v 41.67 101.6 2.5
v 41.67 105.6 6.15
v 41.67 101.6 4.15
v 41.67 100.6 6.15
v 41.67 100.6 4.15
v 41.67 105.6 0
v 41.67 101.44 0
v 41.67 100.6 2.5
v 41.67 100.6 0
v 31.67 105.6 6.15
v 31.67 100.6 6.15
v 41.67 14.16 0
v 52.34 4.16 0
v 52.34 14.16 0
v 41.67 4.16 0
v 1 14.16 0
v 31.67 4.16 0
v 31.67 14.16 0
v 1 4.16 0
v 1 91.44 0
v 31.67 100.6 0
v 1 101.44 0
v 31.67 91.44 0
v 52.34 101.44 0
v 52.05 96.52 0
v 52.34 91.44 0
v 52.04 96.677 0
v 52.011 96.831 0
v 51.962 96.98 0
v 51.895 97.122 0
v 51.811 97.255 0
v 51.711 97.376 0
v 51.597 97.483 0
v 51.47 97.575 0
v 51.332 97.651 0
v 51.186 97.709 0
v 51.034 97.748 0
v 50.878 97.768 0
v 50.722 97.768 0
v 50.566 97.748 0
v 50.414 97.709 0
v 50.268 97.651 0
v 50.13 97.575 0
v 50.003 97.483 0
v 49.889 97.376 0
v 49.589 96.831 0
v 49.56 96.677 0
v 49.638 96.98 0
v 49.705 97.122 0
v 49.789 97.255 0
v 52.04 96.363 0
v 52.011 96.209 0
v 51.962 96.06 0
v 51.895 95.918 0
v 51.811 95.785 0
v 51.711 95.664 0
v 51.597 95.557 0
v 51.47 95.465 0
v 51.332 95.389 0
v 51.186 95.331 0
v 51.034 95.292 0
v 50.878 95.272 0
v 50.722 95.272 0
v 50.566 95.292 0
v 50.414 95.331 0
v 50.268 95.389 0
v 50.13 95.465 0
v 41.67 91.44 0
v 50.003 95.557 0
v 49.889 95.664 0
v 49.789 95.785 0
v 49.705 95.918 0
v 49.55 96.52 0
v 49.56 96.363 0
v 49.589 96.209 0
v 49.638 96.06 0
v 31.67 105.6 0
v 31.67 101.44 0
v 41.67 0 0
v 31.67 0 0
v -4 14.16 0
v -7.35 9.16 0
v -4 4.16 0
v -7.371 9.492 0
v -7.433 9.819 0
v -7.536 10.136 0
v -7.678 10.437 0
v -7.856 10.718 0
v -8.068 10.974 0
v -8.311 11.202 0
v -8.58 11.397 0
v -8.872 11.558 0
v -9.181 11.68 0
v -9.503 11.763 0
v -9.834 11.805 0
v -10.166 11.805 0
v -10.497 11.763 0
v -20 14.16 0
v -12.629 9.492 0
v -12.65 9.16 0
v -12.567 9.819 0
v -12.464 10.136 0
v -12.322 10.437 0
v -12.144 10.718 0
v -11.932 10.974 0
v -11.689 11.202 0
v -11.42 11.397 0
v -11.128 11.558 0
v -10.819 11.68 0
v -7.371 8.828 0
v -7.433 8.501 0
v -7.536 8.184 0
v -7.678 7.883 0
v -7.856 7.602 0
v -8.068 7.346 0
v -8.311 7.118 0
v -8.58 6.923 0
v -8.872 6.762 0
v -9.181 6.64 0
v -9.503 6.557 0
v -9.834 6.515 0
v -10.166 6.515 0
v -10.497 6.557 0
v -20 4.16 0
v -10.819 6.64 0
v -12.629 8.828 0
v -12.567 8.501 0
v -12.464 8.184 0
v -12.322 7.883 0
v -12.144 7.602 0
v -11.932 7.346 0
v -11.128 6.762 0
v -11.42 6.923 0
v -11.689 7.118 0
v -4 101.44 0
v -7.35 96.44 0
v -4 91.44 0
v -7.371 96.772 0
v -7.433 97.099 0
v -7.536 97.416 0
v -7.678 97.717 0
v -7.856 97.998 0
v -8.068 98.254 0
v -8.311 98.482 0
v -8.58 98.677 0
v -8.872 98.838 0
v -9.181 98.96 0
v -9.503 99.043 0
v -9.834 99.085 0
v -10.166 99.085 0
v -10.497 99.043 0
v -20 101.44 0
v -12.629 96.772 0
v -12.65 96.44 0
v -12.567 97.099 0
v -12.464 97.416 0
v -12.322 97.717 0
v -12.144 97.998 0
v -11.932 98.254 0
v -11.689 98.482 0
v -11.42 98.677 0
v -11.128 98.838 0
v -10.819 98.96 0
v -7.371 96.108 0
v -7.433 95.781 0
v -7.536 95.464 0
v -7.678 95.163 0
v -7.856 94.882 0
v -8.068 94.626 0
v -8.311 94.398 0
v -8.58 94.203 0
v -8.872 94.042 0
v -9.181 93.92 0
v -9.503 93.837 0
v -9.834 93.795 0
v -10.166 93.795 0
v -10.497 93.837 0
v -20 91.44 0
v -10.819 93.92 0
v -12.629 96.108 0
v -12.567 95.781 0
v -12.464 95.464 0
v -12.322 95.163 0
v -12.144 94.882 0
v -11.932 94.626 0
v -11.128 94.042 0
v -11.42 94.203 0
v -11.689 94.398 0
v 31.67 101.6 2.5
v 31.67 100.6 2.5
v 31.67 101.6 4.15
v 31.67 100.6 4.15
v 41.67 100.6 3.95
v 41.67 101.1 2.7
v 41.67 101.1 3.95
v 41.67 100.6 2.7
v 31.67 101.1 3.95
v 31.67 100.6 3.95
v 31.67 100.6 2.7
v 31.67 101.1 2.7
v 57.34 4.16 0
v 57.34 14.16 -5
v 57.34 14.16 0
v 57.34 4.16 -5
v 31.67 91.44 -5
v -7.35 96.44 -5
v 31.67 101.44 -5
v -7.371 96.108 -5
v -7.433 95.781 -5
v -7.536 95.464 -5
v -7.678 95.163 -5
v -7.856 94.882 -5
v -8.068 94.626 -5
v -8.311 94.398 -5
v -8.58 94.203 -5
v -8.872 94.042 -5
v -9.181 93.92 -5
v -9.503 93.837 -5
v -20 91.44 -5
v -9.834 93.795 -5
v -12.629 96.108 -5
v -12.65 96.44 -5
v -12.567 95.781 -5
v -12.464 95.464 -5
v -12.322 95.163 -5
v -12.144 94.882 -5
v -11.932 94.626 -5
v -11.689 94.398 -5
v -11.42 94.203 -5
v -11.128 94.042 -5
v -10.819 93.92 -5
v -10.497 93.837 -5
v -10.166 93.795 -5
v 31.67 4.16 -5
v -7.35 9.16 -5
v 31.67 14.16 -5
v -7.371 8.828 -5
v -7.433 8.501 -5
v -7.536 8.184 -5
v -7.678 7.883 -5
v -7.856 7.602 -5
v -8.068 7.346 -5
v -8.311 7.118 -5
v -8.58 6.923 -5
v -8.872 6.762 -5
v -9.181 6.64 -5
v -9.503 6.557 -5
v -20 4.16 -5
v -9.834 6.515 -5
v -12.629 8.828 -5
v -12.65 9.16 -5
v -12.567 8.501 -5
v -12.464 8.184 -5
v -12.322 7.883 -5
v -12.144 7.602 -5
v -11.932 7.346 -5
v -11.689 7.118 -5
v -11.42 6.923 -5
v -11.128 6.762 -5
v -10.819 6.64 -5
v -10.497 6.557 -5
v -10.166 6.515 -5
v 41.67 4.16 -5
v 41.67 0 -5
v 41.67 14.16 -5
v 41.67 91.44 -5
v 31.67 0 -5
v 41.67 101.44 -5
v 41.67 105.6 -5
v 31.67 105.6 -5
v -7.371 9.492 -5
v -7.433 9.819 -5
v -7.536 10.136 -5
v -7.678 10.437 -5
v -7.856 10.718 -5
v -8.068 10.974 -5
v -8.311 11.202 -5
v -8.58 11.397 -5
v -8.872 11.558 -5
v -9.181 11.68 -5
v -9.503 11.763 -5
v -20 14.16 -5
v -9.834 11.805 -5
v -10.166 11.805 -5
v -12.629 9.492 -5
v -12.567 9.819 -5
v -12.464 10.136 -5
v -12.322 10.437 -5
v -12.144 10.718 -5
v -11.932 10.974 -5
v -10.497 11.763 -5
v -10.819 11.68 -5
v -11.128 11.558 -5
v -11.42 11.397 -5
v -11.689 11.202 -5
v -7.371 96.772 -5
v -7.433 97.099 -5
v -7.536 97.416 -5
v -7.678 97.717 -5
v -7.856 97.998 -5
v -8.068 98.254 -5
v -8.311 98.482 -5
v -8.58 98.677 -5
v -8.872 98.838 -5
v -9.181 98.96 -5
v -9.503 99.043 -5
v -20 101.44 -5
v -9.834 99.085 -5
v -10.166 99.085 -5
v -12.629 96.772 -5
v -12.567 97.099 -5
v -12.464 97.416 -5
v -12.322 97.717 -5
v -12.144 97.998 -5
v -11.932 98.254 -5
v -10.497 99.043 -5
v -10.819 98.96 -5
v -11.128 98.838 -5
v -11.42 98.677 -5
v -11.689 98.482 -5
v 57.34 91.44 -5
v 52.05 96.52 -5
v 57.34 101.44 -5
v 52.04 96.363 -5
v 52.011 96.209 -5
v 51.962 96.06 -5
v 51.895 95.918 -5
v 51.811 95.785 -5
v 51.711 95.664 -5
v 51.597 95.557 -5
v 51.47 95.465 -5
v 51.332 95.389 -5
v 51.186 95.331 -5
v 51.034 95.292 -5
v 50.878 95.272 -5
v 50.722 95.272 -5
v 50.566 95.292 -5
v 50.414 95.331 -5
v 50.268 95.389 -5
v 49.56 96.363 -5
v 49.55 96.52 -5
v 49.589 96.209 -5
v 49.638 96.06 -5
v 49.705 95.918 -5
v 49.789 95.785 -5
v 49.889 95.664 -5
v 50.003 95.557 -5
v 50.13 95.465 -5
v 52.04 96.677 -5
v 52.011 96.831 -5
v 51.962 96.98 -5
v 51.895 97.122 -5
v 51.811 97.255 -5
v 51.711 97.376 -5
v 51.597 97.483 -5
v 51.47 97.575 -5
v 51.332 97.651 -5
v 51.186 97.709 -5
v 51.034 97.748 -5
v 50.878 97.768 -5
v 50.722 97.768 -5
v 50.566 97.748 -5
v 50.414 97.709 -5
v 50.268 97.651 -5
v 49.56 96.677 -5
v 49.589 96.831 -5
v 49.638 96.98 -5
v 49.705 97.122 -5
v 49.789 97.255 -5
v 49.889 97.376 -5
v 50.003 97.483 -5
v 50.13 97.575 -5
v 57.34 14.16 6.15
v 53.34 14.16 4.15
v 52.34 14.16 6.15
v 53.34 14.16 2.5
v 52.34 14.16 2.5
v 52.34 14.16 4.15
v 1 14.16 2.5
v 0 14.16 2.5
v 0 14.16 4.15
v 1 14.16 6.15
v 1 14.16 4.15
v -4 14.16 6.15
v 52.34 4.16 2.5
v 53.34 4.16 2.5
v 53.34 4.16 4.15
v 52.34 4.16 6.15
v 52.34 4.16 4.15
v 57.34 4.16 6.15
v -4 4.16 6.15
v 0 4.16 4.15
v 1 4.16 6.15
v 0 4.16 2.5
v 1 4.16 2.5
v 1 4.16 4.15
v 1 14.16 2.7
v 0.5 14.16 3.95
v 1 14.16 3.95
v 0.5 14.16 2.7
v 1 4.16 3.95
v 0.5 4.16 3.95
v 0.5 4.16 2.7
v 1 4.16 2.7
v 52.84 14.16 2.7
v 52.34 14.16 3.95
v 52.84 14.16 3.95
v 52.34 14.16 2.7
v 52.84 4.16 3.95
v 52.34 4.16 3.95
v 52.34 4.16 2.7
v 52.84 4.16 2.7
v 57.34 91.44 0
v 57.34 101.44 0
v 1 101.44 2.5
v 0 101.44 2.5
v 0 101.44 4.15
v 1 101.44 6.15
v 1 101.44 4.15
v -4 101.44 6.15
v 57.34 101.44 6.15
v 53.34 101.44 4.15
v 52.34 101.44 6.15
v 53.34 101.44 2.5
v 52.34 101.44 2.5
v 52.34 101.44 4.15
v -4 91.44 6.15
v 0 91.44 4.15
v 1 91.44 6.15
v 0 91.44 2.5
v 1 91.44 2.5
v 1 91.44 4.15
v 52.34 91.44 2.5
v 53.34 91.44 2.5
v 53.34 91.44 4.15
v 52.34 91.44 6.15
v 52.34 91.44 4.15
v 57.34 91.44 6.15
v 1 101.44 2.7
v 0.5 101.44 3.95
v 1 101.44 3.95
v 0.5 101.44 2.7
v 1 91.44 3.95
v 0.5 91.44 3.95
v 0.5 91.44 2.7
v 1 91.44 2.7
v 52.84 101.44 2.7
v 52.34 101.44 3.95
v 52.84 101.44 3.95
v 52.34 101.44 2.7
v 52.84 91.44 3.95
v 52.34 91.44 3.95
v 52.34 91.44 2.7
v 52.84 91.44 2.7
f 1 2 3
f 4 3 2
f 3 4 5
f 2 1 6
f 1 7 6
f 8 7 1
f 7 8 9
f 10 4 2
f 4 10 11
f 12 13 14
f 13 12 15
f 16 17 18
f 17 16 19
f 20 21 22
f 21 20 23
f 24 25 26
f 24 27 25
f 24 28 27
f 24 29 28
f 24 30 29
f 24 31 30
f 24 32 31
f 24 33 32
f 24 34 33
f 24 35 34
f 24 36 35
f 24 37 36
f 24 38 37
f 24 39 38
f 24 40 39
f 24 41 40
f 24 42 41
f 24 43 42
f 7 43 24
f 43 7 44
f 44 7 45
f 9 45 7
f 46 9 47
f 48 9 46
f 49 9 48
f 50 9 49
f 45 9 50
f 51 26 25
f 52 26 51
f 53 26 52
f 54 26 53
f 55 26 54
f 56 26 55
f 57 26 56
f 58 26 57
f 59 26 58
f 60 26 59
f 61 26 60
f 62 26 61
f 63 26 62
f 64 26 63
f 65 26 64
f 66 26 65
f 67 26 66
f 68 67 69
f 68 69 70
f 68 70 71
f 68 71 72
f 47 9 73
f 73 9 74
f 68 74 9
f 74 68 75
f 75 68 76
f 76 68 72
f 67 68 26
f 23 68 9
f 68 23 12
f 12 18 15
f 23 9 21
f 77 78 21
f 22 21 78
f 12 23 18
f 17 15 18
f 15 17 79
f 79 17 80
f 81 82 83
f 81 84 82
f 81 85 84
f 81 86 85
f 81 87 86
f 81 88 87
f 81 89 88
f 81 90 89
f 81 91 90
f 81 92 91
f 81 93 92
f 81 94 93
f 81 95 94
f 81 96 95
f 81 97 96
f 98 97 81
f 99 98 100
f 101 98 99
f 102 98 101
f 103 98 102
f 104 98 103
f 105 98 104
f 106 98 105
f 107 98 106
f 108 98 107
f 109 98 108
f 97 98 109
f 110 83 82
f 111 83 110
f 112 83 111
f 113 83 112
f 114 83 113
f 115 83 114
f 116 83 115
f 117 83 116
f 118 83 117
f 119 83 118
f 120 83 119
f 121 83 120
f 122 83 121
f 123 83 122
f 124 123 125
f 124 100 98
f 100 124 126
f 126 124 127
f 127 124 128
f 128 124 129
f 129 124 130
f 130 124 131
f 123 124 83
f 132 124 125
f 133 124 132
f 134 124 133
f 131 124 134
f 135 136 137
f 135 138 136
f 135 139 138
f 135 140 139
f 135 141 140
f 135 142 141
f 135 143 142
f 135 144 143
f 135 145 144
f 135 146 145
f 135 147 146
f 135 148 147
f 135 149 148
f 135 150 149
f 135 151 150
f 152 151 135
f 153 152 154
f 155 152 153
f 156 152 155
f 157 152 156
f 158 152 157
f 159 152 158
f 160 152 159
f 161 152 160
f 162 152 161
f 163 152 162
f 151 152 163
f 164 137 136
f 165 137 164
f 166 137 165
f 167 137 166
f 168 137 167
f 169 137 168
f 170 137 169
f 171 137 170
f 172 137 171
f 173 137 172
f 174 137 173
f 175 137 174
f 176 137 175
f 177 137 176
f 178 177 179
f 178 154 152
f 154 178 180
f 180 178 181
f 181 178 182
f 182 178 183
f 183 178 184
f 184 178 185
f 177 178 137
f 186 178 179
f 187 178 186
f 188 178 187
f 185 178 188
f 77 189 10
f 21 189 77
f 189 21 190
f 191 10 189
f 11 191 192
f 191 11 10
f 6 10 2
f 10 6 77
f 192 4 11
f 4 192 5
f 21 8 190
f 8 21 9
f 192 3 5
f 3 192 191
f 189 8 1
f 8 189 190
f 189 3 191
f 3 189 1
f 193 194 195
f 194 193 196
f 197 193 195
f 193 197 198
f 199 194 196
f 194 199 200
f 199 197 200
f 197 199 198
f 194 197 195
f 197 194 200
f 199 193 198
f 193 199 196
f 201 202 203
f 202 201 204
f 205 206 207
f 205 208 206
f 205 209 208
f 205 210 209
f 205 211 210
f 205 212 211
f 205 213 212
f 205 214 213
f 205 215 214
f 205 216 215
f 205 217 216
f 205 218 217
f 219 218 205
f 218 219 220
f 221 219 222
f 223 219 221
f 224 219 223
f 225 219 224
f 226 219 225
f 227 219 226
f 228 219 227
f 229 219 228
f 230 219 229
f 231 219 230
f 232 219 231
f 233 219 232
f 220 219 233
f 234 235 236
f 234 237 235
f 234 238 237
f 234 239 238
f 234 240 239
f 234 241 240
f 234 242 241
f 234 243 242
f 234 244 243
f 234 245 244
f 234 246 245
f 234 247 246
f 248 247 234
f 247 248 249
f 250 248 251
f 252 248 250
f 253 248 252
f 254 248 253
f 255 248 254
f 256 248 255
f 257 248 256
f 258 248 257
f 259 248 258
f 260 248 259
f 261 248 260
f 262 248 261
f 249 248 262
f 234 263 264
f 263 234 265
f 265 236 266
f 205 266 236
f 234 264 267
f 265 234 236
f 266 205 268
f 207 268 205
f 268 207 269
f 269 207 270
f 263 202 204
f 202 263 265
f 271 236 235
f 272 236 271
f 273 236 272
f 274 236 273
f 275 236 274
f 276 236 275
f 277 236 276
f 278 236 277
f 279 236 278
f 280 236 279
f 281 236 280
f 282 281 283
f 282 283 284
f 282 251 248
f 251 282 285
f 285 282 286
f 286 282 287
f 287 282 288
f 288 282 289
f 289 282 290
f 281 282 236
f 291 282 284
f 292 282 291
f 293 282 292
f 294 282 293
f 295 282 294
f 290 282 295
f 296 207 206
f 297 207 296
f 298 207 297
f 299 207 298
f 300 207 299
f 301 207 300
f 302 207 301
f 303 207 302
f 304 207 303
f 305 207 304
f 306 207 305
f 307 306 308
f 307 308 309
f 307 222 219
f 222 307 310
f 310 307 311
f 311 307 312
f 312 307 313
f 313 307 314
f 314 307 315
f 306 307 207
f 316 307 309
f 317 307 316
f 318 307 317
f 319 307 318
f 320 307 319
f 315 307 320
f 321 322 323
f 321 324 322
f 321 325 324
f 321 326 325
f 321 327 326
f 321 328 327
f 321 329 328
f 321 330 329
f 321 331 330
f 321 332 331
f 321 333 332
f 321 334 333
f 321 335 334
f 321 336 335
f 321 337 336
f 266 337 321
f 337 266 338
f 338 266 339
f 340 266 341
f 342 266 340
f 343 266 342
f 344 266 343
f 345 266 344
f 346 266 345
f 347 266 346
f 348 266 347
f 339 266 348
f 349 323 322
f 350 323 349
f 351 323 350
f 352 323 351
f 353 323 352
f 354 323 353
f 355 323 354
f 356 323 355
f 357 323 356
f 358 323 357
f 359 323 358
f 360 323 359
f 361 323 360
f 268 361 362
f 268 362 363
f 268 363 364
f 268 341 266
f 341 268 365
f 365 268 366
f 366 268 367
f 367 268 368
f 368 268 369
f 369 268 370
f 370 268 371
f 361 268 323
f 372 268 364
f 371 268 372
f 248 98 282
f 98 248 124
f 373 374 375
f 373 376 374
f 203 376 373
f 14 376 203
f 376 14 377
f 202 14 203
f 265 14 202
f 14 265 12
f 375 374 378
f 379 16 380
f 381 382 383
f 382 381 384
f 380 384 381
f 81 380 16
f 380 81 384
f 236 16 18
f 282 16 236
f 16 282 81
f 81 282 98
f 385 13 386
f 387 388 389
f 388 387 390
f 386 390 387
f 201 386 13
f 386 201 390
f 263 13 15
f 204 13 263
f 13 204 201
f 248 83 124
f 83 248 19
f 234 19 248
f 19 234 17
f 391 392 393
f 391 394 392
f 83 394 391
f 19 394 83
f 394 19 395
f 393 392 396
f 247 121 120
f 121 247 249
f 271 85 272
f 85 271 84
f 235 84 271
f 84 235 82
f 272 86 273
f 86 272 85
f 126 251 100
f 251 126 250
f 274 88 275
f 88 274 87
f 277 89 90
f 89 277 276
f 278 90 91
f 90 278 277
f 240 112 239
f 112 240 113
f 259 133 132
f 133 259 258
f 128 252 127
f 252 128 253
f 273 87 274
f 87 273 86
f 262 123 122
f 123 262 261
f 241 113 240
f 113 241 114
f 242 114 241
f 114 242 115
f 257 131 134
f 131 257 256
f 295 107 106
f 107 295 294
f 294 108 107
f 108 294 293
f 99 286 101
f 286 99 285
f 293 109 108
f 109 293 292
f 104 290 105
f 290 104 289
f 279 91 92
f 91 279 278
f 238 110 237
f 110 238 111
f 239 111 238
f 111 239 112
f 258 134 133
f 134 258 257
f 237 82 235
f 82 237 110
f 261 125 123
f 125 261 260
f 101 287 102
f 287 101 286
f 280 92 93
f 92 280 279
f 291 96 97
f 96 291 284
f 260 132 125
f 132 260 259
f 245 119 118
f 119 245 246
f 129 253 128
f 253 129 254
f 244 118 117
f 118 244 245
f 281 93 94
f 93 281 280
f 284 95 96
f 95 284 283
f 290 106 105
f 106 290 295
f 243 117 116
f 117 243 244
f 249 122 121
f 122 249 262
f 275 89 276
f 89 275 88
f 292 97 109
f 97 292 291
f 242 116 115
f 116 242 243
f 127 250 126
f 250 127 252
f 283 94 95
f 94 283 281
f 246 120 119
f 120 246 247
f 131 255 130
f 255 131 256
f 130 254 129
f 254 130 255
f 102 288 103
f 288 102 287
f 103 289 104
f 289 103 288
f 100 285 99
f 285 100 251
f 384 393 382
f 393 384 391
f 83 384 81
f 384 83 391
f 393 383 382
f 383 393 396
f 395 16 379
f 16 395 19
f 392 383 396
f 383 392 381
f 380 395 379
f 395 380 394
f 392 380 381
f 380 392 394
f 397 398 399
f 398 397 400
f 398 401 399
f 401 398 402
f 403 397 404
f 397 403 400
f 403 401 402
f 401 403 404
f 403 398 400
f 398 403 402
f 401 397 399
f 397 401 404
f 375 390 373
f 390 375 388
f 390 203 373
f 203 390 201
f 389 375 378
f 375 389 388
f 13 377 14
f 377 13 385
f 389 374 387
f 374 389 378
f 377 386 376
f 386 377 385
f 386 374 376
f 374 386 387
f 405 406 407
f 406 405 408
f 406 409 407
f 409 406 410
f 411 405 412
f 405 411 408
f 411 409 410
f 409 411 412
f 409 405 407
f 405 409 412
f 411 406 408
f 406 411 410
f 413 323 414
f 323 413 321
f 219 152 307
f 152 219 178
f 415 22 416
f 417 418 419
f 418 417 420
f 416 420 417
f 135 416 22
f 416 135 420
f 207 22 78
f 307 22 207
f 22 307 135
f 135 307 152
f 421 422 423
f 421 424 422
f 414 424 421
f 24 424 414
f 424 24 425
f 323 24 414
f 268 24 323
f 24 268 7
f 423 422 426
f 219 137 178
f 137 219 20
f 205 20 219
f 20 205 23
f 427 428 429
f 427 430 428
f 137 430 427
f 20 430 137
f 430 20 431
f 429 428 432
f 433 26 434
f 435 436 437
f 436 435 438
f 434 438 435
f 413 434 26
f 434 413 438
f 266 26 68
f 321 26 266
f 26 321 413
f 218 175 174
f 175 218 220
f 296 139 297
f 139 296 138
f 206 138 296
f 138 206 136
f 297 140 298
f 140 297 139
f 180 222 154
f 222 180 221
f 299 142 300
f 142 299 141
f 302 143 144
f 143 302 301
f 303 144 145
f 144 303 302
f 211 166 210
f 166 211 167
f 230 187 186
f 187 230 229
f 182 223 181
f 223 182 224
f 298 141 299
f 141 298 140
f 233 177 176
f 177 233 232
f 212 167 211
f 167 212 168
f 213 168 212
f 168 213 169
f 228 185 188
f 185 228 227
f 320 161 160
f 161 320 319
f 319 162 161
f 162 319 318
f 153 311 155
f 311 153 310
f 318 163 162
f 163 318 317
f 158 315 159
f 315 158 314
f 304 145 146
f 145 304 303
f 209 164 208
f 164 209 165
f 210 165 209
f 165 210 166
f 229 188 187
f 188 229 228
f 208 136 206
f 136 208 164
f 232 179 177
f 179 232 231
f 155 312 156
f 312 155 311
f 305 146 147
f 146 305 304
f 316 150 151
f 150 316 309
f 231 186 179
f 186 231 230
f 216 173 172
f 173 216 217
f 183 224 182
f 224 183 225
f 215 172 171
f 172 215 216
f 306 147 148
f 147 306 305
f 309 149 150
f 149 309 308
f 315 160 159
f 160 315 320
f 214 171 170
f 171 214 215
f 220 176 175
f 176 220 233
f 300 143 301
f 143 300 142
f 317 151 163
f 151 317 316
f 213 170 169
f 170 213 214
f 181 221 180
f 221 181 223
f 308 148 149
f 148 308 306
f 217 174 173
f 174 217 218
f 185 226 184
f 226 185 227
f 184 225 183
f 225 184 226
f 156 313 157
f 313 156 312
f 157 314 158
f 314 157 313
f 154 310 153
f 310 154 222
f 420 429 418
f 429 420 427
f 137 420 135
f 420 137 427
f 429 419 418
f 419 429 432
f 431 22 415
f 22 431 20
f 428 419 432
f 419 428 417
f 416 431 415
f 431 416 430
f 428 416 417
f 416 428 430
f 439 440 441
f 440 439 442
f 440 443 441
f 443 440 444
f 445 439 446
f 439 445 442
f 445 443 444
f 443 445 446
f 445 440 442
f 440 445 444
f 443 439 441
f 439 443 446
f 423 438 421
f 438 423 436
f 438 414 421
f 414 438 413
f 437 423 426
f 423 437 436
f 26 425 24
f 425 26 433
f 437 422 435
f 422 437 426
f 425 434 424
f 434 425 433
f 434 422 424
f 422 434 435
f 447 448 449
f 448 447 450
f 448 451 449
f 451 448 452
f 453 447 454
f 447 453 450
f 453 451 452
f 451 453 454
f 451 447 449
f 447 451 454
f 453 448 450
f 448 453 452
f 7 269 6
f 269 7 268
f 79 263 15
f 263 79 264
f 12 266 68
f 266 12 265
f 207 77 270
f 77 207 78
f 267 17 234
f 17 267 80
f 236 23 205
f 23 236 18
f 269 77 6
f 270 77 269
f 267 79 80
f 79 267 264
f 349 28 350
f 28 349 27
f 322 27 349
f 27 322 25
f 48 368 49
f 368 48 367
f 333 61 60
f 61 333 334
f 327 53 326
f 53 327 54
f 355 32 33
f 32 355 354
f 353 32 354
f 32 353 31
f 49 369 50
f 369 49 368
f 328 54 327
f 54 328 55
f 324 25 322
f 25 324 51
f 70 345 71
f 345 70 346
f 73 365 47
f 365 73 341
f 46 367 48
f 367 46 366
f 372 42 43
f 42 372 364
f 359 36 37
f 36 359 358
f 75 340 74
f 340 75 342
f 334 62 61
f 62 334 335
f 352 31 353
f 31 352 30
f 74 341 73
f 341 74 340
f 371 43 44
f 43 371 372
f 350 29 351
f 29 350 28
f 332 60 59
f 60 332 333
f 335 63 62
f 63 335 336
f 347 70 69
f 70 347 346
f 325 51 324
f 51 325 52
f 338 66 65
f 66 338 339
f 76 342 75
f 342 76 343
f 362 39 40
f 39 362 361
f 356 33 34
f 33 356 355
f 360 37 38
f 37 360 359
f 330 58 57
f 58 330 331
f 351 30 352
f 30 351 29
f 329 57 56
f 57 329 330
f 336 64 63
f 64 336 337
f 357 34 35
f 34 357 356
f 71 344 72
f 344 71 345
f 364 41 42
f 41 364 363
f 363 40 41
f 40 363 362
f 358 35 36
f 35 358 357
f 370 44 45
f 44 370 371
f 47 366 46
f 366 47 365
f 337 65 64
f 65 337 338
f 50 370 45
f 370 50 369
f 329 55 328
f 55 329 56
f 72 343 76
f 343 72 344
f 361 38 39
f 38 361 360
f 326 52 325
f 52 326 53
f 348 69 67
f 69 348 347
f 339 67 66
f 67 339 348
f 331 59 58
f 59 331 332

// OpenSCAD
pcb=[53.34, 101.6, 1.65];
pcb_bottom_space=2.5;
hole=[pcb[0]-2.54, 96.52];
thickness=5;
solt_depth=1;
x=(pcb[1]-hole[1])*2-5;

$fn=50;

//translate([0, 0, pcb_bottom_space]) cube(pcb);
difference() {
    union() {
        main();
        //translate([hole[0], hole[1], pcb_bottom_space+pcb[2]]) cylinder(d=7, h=2);  
    }
    translate([hole[0], hole[1], -thickness]) cylinder(d=2.5, h=thickness);
}

module main() {
translate([(pcb[0]-10)/2+10, 0, -thickness]) cube([10, pcb[1]+thickness-solt_depth, thickness]);
translate([(pcb[0]-10)/2+10, pcb[1], 0]) holder();

//translate([pcb[0]-10, 0, -thickness]) cube([10, pcb[1]+thickness-solt_depth, thickness]);
//translate([pcb[0]-10, pcb[1], 0]) holder();

translate([-20, x-solt_depth, -thickness]) difference() {
    cube([20+pcb[0]+thickness-solt_depth, 10, thickness]);
    translate([20/2, 10/2, 0]) cylinder(d=5+0.3, h=thickness);
}
translate([0, x-solt_depth, 0]) rotate([0, 0, 90]) holder();
translate([pcb[0], x-solt_depth, 0]) mirror([1, 0, 0]) rotate([0, 0, 90]) holder();

translate([-20, (pcb[1]+thickness)-10-x, -thickness]) difference() {
    cube([20+pcb[0]+thickness-solt_depth, 10, thickness]);
    translate([20/2, 10/2, 0]) cylinder(d=5+0.3, h=thickness);
}
translate([0, (pcb[1]+thickness)-10-x, 0]) rotate([0, 0, 90]) holder();
translate([pcb[0], (pcb[1]+thickness)-10-x, 0]) mirror([1, 0, 0]) rotate([0, 0, 90]) holder();
}

module holder() translate([0, -solt_depth, 0]) {
    difference() {
        cube([10, thickness, pcb_bottom_space+pcb[2]+2]);
        translate([0, 0, pcb_bottom_space])
            cube([10, solt_depth, pcb[2]]);
    }
    // support
    #translate([0, 0, pcb_bottom_space+0.2])
        cube([10, 0.4+0.1, pcb[2]-0.2*2]);
}
